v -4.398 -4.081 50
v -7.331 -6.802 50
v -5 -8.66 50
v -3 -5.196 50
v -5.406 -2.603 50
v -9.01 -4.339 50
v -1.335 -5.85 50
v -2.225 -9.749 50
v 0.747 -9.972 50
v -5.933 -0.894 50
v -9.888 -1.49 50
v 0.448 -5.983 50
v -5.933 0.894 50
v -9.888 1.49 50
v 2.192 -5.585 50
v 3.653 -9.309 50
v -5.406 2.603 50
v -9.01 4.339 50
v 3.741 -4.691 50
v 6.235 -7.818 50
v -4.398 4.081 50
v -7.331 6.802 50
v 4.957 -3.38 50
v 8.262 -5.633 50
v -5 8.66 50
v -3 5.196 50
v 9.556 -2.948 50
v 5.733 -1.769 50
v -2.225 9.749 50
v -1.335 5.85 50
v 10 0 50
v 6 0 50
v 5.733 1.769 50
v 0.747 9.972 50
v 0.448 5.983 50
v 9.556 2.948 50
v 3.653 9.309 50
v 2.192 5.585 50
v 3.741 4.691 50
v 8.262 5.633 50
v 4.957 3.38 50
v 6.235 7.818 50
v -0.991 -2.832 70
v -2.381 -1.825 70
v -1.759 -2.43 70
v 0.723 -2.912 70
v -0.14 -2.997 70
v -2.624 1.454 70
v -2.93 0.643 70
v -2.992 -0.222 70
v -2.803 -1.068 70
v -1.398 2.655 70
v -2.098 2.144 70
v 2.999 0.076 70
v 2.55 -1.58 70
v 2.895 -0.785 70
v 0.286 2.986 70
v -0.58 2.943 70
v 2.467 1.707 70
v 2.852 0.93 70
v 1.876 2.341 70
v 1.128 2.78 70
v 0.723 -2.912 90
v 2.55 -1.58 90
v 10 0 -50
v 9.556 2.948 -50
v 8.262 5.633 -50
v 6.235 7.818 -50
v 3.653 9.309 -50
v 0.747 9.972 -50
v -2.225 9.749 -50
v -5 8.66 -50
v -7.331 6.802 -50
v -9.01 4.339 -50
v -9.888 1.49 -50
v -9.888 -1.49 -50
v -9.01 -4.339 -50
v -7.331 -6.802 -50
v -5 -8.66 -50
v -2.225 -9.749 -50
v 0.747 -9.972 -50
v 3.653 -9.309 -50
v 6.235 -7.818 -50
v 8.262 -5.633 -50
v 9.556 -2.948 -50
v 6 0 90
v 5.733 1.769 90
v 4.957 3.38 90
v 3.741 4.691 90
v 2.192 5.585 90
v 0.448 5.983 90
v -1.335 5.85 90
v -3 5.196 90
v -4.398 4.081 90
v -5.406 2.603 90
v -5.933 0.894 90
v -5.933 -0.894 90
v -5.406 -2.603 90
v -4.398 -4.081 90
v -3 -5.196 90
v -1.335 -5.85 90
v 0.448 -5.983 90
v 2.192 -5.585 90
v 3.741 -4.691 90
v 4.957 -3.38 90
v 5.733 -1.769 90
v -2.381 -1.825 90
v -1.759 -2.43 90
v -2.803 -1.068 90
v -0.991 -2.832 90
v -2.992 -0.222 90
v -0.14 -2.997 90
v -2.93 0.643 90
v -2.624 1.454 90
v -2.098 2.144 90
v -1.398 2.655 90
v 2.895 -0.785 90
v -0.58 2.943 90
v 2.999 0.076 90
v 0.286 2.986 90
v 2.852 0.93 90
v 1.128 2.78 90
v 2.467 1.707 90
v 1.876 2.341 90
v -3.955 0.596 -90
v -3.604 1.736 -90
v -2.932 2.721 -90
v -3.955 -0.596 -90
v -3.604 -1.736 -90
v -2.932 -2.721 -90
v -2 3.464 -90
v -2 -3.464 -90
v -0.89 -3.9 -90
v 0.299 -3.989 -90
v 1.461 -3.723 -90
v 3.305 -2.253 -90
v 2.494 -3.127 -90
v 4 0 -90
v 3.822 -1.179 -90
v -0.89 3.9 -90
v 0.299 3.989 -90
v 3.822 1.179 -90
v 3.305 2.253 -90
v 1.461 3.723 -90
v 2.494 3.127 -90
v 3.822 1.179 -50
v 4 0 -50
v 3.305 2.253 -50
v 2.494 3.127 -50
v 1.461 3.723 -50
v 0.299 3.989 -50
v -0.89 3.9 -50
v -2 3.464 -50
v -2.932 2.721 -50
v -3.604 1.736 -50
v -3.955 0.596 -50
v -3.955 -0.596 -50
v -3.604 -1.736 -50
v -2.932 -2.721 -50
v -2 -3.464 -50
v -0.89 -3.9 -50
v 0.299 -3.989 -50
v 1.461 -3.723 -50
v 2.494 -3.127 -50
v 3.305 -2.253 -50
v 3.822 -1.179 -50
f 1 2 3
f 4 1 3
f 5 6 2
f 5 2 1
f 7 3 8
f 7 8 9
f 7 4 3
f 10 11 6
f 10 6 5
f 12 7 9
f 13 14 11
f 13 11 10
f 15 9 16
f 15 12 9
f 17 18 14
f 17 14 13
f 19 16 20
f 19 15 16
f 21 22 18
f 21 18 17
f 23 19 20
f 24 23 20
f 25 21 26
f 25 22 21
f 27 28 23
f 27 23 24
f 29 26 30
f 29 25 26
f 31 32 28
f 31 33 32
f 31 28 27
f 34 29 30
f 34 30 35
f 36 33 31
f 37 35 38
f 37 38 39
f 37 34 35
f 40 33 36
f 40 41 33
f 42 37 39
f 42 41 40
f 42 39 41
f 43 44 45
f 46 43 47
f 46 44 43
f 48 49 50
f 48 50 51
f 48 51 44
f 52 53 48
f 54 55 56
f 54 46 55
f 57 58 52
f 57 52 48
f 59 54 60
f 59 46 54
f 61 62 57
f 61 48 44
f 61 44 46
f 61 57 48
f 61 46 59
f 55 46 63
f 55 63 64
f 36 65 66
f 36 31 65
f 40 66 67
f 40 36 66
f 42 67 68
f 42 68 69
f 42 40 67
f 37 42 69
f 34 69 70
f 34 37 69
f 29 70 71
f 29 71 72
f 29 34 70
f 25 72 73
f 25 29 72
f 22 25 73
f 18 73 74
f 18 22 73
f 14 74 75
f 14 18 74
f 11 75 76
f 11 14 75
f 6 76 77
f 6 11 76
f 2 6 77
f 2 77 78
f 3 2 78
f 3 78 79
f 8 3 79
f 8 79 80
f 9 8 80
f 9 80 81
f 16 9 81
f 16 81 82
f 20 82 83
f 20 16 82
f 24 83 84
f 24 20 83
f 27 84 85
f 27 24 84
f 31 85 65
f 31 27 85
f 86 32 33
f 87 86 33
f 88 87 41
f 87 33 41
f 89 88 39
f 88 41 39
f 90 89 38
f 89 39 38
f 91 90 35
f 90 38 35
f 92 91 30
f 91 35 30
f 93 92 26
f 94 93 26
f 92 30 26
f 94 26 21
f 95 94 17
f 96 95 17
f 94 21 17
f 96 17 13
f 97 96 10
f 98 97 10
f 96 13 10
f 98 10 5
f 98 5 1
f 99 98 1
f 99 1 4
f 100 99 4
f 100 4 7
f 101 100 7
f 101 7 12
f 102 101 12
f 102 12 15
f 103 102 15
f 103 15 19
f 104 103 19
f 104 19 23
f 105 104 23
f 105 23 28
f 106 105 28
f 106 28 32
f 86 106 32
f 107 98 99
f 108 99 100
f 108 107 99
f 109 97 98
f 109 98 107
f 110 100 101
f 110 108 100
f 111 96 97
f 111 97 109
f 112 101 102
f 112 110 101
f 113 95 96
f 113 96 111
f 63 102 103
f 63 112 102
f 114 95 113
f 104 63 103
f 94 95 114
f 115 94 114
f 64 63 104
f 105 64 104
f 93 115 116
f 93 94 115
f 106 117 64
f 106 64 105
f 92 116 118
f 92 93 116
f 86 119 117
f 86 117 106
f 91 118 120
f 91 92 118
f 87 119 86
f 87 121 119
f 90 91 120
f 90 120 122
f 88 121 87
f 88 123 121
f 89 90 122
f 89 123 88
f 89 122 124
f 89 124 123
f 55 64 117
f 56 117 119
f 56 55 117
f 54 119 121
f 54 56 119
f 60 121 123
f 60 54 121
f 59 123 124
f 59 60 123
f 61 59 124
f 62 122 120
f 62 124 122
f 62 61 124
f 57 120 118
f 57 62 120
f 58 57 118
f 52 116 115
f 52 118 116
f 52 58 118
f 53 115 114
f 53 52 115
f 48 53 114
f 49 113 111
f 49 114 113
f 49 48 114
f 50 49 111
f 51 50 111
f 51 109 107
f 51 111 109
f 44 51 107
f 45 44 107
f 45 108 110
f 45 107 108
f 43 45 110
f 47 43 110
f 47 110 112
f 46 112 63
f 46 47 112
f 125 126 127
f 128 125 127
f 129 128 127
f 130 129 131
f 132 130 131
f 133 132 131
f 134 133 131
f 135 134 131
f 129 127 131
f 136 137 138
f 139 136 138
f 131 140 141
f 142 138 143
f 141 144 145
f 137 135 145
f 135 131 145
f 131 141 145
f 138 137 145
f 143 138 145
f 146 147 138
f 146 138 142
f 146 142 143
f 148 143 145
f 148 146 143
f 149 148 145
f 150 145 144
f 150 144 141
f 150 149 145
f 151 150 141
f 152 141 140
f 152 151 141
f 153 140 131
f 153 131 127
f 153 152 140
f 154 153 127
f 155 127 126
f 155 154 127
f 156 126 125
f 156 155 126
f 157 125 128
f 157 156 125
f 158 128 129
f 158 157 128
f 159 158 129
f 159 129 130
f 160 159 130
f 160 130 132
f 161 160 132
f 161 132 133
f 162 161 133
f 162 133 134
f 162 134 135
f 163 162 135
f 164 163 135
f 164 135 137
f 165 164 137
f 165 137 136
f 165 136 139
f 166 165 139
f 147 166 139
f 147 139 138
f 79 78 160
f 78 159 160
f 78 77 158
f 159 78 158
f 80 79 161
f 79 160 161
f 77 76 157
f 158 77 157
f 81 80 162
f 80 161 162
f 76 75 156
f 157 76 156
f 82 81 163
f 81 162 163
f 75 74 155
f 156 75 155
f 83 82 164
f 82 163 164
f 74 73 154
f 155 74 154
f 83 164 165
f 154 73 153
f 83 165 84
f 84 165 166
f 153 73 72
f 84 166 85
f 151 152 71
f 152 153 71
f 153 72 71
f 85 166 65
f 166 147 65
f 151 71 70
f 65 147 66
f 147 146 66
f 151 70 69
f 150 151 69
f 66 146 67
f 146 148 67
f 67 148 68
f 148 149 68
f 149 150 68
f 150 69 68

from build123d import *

# Parameters (mm, degrees)
SKETCH_R          = 10
PAD_DEPTH         = 50
PAD_DEPTH_BACK    = 50
SKETCH001_R       = 6
PAD001_DEPTH      = 90
POCKET_DEPTH      = 80
SKETCH003_R       = 4
PAD002_DEPTH      = 1
PAD002_DEPTH_BACK = 90


with BuildPart() as part:
    # Sketch → Pad (new body, two sides)
    with BuildSketch(Plane.XY) as pad_sk:
        Circle(SKETCH_R)
    extrude(amount=PAD_DEPTH)
    extrude(pad_sk.sketch, amount=-PAD_DEPTH_BACK)

    # Sketch001 → Pad001 (join)
    with BuildSketch(Plane.XY):
        Circle(SKETCH001_R)
    extrude(amount=PAD001_DEPTH)

    # Sketch002 (on Face7 of Pad001) → Pocket (cut)
    with BuildSketch(Plane.XY.offset(70)):
        with BuildLine():
            ThreePointArc((2.549937, -1.580449), (-1.766635, 2.424665), (0.722998, -2.911576))
            Line((0.722998, -2.911576), (2.549937, -1.580449))
        make_face()
    extrude(amount=POCKET_DEPTH, mode=Mode.SUBTRACT)

    # Sketch003 → Pad002 (join, two sides)
    with BuildSketch(Plane.XY) as pad002_sk:
        Circle(SKETCH003_R)
    extrude(amount=PAD002_DEPTH)
    extrude(pad002_sk.sketch, amount=-PAD002_DEPTH_BACK)


solid = part.part
